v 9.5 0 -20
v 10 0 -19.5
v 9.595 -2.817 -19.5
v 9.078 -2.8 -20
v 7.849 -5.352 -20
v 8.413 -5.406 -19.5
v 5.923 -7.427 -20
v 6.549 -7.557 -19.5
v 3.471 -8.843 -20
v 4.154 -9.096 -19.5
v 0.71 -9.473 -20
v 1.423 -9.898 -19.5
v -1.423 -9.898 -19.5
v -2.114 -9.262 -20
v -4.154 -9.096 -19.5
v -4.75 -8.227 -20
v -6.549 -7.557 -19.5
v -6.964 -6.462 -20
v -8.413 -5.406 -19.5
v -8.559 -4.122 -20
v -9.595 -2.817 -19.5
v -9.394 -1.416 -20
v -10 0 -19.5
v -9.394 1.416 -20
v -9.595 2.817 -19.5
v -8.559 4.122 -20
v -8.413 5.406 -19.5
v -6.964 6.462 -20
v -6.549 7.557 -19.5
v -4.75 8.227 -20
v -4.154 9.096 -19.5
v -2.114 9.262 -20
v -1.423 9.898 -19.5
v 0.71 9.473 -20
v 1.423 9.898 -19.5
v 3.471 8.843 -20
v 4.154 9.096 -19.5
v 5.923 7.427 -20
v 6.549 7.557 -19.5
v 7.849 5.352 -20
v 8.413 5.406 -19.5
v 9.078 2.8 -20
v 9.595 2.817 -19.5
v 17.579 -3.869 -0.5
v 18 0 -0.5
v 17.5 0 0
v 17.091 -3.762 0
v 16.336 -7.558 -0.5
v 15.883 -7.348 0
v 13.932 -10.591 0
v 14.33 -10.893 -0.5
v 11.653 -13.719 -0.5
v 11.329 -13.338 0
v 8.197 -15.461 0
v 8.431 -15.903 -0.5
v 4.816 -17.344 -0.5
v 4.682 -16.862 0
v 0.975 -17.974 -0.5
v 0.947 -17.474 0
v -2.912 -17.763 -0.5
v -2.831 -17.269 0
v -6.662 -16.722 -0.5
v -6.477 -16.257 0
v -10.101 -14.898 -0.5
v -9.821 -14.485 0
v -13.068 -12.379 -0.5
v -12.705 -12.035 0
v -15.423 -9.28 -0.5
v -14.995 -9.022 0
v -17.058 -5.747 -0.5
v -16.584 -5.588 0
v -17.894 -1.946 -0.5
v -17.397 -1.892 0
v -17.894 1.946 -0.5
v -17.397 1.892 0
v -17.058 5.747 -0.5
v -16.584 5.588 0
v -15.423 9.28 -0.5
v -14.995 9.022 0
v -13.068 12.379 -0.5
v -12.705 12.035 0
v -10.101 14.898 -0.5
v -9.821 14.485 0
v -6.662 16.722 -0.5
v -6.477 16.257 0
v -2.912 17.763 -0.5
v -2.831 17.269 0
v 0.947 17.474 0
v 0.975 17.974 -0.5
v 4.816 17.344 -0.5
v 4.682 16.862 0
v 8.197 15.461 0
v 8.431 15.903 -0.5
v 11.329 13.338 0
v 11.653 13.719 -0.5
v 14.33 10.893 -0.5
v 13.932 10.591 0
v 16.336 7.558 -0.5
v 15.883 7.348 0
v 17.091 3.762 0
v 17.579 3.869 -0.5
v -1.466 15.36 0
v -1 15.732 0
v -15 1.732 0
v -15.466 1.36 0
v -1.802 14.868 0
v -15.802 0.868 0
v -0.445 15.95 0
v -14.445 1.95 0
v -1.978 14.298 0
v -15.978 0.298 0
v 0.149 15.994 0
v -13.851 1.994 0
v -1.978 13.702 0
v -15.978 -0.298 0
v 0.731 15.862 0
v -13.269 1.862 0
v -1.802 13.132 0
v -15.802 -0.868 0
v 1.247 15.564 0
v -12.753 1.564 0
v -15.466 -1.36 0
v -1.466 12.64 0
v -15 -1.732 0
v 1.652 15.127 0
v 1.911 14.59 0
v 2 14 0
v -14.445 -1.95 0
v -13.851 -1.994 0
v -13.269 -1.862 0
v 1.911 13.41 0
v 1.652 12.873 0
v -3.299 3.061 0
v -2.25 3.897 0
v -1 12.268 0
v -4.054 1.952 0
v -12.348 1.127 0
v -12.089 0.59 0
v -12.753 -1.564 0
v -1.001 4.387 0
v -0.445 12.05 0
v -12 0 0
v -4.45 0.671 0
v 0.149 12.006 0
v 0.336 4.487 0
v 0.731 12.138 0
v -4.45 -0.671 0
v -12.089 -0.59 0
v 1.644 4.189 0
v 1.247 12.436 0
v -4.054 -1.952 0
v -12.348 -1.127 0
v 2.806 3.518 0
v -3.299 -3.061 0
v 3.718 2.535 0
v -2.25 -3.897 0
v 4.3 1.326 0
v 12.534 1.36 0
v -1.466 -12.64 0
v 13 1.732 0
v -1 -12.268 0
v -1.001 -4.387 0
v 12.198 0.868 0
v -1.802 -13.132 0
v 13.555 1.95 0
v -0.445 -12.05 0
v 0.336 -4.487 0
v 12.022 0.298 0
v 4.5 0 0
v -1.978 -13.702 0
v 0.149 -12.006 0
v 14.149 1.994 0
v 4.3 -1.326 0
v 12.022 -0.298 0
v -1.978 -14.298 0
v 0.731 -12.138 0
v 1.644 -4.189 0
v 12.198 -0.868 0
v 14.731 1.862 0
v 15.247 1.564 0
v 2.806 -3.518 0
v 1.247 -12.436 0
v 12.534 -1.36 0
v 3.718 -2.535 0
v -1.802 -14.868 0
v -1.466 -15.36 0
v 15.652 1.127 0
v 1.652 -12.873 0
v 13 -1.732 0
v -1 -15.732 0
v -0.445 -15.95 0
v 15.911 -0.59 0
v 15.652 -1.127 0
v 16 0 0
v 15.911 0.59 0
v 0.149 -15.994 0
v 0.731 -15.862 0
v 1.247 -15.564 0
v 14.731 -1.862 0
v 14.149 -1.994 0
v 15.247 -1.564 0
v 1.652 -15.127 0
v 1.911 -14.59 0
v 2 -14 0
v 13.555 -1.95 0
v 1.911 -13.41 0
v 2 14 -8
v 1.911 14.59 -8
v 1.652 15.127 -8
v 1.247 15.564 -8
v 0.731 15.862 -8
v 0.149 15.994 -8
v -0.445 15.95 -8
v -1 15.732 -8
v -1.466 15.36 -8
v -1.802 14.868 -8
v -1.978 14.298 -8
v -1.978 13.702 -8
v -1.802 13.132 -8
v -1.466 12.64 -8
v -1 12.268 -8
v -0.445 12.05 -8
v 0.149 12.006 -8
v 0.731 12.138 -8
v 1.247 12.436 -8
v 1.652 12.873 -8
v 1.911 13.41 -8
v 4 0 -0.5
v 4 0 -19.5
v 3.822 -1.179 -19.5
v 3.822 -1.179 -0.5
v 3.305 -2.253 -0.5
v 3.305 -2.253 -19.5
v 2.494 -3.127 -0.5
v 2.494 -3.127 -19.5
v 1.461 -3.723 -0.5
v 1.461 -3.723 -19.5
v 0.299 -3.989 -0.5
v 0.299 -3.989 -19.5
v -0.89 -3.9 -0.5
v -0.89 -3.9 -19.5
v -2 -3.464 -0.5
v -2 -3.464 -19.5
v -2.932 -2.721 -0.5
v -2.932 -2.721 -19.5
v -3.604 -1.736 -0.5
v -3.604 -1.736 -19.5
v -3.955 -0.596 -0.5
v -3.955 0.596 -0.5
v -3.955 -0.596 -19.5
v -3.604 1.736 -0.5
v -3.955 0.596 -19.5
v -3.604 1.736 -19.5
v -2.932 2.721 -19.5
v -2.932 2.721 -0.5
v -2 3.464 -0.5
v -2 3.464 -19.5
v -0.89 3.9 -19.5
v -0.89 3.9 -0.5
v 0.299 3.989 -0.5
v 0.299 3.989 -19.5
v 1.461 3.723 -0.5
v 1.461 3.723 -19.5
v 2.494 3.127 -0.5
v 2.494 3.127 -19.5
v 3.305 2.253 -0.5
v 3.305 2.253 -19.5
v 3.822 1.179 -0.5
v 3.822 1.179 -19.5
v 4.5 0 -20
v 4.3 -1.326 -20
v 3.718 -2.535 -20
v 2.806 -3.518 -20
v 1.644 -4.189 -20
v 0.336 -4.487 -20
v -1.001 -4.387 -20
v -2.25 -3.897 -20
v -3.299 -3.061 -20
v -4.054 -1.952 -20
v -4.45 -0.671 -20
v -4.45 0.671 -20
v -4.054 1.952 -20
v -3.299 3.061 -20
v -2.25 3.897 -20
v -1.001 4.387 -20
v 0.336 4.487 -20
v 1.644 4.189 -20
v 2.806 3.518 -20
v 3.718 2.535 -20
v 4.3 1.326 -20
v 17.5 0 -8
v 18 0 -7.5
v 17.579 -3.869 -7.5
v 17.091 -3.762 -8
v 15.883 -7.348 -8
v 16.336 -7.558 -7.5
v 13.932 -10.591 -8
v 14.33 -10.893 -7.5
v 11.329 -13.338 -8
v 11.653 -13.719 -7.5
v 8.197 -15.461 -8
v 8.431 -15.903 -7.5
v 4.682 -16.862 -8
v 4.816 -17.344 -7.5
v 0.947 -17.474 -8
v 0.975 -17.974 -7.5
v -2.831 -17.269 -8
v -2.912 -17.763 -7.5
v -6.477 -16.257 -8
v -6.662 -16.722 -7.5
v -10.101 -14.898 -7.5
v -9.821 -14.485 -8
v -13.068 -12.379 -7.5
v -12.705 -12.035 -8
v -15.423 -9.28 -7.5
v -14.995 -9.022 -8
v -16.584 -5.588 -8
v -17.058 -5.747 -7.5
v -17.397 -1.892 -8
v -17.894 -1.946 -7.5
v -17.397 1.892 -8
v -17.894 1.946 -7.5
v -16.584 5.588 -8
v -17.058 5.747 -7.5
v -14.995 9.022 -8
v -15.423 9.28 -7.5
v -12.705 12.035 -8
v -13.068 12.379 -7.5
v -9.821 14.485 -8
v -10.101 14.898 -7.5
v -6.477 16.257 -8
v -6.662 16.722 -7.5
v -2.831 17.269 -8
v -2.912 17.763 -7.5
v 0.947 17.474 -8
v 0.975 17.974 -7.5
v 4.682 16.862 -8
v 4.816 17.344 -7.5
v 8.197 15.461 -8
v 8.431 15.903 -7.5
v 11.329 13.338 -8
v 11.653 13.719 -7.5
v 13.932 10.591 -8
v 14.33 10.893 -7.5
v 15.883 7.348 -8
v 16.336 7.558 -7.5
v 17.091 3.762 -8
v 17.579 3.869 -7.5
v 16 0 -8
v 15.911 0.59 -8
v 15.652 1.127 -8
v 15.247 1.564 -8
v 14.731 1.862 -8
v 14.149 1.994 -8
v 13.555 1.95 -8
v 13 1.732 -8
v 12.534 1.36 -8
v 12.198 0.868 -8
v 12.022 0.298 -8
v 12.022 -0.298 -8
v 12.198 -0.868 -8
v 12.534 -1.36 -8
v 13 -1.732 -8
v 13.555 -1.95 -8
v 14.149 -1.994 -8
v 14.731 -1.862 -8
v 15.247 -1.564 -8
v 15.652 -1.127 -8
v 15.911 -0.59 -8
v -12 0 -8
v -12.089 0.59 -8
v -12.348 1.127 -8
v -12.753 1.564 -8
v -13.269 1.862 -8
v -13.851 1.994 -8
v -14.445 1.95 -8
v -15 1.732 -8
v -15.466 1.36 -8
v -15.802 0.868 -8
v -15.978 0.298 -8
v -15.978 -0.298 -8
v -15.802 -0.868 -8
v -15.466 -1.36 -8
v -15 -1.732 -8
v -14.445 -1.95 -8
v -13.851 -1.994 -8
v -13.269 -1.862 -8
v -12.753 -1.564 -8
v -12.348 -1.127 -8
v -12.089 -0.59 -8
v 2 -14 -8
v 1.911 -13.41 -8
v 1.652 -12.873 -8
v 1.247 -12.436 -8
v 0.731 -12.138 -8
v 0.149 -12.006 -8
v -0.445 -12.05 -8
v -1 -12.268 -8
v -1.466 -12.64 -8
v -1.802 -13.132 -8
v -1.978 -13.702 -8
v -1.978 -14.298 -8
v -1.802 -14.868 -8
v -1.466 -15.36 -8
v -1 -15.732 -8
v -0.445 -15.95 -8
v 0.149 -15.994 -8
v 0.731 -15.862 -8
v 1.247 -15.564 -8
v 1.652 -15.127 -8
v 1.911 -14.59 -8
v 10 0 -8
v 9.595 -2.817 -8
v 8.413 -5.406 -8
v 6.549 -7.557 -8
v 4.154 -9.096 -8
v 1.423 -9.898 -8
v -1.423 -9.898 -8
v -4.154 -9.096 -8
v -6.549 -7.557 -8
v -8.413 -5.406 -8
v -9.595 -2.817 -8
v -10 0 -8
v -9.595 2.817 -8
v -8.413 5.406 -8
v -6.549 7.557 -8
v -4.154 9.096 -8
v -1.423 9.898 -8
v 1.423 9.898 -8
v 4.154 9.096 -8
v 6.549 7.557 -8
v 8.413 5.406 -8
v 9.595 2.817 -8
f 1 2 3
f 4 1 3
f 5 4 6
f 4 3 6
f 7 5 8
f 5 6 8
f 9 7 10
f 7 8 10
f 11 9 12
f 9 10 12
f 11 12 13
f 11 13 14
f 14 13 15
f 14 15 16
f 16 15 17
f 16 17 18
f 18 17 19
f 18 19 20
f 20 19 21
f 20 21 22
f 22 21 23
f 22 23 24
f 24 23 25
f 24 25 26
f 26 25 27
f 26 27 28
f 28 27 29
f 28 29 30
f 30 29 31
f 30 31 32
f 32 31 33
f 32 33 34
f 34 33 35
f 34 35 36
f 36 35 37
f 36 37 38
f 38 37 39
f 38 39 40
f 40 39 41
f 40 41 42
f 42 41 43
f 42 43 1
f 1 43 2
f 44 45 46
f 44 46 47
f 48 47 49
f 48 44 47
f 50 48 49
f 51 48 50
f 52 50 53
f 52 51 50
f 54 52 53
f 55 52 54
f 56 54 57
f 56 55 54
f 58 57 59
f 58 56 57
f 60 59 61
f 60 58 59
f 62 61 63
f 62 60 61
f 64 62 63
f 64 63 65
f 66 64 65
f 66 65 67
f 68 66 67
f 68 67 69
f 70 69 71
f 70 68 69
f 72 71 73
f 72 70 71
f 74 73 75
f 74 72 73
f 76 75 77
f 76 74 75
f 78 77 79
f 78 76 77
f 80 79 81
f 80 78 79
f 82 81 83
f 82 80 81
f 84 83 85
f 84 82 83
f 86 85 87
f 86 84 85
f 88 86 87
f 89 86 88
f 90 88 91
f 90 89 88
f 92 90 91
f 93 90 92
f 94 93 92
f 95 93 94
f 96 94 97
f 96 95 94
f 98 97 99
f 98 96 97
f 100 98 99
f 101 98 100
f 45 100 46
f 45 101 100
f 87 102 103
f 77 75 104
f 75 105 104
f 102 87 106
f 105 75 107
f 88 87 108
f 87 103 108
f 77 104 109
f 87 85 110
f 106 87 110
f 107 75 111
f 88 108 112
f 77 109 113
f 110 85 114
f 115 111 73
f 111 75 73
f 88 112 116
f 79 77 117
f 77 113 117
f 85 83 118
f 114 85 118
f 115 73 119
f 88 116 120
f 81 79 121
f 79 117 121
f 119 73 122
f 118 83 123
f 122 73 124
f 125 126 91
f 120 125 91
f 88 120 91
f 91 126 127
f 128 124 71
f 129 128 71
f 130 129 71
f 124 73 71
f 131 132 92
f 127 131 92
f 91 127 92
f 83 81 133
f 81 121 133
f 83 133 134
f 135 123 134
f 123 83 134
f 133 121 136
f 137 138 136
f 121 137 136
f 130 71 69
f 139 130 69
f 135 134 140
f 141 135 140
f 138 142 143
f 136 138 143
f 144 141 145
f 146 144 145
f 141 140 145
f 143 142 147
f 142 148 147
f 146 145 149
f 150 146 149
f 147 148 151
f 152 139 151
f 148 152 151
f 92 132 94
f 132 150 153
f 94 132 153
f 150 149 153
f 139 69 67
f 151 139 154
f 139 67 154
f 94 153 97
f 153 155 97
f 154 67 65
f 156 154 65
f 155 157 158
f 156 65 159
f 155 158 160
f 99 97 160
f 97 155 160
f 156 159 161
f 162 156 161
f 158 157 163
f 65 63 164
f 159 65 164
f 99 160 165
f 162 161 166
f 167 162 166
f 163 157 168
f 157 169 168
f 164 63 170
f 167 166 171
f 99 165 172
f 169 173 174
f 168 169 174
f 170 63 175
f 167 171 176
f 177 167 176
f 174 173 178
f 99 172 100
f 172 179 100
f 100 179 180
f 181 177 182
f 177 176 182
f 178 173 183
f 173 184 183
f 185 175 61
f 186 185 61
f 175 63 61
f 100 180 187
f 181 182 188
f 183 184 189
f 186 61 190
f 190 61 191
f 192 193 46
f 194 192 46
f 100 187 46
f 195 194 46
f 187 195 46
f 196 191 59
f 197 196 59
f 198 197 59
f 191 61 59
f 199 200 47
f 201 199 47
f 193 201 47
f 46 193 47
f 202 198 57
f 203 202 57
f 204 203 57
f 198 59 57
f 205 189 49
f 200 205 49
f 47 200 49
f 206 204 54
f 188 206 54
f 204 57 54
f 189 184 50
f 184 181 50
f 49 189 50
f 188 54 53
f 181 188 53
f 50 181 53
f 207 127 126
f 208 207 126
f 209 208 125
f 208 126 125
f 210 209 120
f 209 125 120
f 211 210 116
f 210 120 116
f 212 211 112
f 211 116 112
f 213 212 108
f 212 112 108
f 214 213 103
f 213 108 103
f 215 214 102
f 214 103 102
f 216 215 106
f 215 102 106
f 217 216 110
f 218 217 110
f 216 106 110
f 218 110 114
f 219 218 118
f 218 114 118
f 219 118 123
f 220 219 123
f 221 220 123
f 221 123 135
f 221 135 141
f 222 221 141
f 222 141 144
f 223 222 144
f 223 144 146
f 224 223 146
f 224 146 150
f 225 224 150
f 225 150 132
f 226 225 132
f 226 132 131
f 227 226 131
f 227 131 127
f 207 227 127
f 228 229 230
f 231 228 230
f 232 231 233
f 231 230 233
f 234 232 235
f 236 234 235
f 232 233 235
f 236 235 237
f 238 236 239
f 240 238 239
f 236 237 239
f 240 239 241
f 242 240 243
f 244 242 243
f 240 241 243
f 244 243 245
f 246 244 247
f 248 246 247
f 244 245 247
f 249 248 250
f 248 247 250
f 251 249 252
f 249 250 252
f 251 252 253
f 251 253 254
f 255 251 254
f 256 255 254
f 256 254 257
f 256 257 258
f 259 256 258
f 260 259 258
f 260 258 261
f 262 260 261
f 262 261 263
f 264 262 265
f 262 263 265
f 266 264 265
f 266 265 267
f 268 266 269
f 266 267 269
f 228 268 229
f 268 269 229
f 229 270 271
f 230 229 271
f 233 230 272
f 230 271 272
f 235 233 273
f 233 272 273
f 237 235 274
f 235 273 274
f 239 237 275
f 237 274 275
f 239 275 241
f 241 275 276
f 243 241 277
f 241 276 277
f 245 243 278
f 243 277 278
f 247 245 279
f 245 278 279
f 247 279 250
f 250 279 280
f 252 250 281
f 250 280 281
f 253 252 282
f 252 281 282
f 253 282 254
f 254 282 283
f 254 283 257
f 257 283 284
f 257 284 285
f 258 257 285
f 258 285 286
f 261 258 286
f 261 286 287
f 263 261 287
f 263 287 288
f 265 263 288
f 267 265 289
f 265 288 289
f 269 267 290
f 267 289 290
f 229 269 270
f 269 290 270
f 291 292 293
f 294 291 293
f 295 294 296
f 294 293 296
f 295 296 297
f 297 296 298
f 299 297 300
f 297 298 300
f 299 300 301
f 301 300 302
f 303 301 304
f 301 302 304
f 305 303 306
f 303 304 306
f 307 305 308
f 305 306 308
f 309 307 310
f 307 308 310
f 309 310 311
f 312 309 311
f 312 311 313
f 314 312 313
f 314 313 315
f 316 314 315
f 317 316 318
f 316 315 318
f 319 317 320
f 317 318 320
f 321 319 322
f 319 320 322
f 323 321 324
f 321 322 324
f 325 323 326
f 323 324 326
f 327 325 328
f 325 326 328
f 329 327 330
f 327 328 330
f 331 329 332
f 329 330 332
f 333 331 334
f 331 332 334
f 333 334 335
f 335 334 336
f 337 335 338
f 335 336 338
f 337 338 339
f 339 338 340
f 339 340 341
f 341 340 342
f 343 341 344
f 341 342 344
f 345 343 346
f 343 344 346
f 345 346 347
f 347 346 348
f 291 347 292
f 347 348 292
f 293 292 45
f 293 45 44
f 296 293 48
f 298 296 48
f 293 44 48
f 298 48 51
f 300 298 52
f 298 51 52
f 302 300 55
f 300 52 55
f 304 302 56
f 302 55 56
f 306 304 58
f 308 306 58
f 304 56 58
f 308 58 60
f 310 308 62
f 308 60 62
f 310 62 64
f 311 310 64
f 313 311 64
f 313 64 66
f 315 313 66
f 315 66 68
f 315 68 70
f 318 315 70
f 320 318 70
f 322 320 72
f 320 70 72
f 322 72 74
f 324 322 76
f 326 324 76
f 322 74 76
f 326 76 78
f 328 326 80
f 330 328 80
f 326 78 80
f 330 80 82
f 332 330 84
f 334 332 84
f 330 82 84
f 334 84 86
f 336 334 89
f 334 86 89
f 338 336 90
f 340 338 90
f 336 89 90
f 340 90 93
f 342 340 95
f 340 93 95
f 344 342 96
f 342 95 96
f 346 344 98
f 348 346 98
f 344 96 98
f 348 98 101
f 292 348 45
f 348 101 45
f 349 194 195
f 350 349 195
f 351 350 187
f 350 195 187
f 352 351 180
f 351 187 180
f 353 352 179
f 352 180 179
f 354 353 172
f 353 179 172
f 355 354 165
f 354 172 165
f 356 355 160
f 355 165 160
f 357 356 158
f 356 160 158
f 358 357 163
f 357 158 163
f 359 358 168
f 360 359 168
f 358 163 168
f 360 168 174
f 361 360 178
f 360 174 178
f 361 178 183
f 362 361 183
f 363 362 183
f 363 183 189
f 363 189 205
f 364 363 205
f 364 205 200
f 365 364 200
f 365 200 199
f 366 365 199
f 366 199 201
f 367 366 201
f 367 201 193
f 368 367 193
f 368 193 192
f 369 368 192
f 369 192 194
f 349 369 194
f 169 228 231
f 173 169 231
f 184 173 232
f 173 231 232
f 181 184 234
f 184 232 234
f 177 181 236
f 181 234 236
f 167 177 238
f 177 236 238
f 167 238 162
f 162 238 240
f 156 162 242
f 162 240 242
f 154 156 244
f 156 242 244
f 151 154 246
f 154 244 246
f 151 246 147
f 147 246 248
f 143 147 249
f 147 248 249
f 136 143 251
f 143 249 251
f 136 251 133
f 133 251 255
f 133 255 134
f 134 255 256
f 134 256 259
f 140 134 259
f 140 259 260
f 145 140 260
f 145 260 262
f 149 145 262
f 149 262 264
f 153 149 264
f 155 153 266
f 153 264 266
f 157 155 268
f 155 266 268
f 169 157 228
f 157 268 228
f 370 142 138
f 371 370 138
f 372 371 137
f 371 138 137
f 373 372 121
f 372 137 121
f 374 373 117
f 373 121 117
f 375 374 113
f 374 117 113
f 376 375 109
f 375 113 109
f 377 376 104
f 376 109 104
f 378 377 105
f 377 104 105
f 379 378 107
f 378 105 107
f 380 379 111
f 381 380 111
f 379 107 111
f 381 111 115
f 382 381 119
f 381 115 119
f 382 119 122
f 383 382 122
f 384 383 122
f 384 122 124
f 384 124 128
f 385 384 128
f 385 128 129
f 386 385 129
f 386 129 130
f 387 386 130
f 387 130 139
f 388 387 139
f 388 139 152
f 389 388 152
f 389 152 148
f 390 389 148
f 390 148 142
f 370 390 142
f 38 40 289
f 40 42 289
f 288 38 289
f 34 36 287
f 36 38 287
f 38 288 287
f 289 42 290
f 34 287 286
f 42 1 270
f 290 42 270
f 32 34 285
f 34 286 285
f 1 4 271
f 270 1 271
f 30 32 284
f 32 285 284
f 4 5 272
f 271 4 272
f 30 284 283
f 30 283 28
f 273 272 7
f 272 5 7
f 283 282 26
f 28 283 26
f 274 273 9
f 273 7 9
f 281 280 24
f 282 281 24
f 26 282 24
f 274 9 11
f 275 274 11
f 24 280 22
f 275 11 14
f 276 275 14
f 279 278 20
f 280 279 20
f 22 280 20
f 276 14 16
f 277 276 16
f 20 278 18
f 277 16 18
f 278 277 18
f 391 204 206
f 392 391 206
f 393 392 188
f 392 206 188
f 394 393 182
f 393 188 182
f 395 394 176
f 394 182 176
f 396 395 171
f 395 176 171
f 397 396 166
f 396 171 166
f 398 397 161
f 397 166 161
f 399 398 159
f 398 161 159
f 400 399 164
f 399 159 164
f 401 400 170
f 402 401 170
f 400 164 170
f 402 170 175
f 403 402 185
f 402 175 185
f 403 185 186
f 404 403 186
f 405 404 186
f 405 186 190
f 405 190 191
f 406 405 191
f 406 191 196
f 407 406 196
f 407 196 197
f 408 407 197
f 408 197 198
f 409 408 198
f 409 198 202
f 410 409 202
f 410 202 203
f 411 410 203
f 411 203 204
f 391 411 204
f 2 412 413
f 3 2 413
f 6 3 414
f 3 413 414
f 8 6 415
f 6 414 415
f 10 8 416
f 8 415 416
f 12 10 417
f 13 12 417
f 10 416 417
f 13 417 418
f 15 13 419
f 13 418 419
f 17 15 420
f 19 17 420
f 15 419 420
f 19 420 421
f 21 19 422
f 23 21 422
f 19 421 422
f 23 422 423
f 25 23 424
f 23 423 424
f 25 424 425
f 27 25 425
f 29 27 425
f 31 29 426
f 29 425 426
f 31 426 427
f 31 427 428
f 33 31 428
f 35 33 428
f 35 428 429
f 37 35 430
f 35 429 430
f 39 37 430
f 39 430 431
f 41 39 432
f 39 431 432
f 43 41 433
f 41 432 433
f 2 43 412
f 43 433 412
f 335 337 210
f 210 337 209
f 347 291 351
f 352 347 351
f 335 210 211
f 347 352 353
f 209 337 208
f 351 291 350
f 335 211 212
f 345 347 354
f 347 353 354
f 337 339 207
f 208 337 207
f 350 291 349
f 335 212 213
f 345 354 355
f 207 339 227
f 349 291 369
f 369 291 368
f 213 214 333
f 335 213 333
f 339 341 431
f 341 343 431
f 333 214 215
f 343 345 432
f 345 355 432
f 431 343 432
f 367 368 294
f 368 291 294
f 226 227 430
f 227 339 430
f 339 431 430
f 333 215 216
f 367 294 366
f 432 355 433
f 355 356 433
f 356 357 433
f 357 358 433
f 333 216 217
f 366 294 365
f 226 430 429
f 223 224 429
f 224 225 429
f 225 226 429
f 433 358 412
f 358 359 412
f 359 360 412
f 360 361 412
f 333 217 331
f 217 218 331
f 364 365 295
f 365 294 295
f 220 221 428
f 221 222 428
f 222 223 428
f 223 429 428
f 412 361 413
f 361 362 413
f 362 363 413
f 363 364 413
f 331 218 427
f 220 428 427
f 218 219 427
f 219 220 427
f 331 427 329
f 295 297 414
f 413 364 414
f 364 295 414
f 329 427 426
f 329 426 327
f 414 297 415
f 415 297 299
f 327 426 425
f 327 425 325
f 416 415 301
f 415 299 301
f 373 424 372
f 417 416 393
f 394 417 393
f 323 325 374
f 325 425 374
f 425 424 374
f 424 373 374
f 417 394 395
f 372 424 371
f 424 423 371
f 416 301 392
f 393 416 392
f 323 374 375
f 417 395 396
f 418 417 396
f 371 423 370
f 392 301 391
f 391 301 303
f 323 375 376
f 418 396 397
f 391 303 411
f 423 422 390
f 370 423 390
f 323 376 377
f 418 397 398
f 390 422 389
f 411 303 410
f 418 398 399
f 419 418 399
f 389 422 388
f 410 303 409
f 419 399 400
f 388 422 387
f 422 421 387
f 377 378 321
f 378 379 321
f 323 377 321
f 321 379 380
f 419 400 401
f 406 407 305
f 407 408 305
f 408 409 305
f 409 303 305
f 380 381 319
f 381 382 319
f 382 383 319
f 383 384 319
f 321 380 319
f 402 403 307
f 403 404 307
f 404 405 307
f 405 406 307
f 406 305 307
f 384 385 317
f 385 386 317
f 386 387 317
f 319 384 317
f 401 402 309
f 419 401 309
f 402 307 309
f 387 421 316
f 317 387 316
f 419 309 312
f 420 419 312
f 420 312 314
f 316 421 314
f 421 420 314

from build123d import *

# Parameters (mm, degrees)
F2_SIZE  = 0.5
F3_R     = 2
F4_DEPTH = 25


with BuildPart() as f1:
    # F0 (on Front) → F1 (revolve)
    with BuildSketch(Plane.XZ):
        Polygon((18, 0), (4, 0), (4, -20), (10, -20), (10, -8), (18, -8), align=None)
    revolve(axis=Axis((0, 0, -14.821168), (0, 0, -1)))

    # F2
    f2_edges = [f1.edges().sort_by_distance(p)[0] for p in [
        (-18, 0, 0),
        (-18, 0, -8),
        (-10, 0, -20),
        (-4, 0, 0),
        (-4, 0, -20),
    ]]
    chamfer(f2_edges, length=F2_SIZE)

    # F3 (on face) → F4 (cut)
    with BuildSketch(Plane.XY):
        with Locations((14, 0)):
            Circle(F3_R)
        with Locations((-14, 0)):
            Circle(F3_R)
        with Locations((0, 14)):
            Circle(F3_R)
        with Locations((0, -14)):
            Circle(F3_R)
    extrude(amount=-F4_DEPTH, mode=Mode.SUBTRACT)


solid = f1.part
